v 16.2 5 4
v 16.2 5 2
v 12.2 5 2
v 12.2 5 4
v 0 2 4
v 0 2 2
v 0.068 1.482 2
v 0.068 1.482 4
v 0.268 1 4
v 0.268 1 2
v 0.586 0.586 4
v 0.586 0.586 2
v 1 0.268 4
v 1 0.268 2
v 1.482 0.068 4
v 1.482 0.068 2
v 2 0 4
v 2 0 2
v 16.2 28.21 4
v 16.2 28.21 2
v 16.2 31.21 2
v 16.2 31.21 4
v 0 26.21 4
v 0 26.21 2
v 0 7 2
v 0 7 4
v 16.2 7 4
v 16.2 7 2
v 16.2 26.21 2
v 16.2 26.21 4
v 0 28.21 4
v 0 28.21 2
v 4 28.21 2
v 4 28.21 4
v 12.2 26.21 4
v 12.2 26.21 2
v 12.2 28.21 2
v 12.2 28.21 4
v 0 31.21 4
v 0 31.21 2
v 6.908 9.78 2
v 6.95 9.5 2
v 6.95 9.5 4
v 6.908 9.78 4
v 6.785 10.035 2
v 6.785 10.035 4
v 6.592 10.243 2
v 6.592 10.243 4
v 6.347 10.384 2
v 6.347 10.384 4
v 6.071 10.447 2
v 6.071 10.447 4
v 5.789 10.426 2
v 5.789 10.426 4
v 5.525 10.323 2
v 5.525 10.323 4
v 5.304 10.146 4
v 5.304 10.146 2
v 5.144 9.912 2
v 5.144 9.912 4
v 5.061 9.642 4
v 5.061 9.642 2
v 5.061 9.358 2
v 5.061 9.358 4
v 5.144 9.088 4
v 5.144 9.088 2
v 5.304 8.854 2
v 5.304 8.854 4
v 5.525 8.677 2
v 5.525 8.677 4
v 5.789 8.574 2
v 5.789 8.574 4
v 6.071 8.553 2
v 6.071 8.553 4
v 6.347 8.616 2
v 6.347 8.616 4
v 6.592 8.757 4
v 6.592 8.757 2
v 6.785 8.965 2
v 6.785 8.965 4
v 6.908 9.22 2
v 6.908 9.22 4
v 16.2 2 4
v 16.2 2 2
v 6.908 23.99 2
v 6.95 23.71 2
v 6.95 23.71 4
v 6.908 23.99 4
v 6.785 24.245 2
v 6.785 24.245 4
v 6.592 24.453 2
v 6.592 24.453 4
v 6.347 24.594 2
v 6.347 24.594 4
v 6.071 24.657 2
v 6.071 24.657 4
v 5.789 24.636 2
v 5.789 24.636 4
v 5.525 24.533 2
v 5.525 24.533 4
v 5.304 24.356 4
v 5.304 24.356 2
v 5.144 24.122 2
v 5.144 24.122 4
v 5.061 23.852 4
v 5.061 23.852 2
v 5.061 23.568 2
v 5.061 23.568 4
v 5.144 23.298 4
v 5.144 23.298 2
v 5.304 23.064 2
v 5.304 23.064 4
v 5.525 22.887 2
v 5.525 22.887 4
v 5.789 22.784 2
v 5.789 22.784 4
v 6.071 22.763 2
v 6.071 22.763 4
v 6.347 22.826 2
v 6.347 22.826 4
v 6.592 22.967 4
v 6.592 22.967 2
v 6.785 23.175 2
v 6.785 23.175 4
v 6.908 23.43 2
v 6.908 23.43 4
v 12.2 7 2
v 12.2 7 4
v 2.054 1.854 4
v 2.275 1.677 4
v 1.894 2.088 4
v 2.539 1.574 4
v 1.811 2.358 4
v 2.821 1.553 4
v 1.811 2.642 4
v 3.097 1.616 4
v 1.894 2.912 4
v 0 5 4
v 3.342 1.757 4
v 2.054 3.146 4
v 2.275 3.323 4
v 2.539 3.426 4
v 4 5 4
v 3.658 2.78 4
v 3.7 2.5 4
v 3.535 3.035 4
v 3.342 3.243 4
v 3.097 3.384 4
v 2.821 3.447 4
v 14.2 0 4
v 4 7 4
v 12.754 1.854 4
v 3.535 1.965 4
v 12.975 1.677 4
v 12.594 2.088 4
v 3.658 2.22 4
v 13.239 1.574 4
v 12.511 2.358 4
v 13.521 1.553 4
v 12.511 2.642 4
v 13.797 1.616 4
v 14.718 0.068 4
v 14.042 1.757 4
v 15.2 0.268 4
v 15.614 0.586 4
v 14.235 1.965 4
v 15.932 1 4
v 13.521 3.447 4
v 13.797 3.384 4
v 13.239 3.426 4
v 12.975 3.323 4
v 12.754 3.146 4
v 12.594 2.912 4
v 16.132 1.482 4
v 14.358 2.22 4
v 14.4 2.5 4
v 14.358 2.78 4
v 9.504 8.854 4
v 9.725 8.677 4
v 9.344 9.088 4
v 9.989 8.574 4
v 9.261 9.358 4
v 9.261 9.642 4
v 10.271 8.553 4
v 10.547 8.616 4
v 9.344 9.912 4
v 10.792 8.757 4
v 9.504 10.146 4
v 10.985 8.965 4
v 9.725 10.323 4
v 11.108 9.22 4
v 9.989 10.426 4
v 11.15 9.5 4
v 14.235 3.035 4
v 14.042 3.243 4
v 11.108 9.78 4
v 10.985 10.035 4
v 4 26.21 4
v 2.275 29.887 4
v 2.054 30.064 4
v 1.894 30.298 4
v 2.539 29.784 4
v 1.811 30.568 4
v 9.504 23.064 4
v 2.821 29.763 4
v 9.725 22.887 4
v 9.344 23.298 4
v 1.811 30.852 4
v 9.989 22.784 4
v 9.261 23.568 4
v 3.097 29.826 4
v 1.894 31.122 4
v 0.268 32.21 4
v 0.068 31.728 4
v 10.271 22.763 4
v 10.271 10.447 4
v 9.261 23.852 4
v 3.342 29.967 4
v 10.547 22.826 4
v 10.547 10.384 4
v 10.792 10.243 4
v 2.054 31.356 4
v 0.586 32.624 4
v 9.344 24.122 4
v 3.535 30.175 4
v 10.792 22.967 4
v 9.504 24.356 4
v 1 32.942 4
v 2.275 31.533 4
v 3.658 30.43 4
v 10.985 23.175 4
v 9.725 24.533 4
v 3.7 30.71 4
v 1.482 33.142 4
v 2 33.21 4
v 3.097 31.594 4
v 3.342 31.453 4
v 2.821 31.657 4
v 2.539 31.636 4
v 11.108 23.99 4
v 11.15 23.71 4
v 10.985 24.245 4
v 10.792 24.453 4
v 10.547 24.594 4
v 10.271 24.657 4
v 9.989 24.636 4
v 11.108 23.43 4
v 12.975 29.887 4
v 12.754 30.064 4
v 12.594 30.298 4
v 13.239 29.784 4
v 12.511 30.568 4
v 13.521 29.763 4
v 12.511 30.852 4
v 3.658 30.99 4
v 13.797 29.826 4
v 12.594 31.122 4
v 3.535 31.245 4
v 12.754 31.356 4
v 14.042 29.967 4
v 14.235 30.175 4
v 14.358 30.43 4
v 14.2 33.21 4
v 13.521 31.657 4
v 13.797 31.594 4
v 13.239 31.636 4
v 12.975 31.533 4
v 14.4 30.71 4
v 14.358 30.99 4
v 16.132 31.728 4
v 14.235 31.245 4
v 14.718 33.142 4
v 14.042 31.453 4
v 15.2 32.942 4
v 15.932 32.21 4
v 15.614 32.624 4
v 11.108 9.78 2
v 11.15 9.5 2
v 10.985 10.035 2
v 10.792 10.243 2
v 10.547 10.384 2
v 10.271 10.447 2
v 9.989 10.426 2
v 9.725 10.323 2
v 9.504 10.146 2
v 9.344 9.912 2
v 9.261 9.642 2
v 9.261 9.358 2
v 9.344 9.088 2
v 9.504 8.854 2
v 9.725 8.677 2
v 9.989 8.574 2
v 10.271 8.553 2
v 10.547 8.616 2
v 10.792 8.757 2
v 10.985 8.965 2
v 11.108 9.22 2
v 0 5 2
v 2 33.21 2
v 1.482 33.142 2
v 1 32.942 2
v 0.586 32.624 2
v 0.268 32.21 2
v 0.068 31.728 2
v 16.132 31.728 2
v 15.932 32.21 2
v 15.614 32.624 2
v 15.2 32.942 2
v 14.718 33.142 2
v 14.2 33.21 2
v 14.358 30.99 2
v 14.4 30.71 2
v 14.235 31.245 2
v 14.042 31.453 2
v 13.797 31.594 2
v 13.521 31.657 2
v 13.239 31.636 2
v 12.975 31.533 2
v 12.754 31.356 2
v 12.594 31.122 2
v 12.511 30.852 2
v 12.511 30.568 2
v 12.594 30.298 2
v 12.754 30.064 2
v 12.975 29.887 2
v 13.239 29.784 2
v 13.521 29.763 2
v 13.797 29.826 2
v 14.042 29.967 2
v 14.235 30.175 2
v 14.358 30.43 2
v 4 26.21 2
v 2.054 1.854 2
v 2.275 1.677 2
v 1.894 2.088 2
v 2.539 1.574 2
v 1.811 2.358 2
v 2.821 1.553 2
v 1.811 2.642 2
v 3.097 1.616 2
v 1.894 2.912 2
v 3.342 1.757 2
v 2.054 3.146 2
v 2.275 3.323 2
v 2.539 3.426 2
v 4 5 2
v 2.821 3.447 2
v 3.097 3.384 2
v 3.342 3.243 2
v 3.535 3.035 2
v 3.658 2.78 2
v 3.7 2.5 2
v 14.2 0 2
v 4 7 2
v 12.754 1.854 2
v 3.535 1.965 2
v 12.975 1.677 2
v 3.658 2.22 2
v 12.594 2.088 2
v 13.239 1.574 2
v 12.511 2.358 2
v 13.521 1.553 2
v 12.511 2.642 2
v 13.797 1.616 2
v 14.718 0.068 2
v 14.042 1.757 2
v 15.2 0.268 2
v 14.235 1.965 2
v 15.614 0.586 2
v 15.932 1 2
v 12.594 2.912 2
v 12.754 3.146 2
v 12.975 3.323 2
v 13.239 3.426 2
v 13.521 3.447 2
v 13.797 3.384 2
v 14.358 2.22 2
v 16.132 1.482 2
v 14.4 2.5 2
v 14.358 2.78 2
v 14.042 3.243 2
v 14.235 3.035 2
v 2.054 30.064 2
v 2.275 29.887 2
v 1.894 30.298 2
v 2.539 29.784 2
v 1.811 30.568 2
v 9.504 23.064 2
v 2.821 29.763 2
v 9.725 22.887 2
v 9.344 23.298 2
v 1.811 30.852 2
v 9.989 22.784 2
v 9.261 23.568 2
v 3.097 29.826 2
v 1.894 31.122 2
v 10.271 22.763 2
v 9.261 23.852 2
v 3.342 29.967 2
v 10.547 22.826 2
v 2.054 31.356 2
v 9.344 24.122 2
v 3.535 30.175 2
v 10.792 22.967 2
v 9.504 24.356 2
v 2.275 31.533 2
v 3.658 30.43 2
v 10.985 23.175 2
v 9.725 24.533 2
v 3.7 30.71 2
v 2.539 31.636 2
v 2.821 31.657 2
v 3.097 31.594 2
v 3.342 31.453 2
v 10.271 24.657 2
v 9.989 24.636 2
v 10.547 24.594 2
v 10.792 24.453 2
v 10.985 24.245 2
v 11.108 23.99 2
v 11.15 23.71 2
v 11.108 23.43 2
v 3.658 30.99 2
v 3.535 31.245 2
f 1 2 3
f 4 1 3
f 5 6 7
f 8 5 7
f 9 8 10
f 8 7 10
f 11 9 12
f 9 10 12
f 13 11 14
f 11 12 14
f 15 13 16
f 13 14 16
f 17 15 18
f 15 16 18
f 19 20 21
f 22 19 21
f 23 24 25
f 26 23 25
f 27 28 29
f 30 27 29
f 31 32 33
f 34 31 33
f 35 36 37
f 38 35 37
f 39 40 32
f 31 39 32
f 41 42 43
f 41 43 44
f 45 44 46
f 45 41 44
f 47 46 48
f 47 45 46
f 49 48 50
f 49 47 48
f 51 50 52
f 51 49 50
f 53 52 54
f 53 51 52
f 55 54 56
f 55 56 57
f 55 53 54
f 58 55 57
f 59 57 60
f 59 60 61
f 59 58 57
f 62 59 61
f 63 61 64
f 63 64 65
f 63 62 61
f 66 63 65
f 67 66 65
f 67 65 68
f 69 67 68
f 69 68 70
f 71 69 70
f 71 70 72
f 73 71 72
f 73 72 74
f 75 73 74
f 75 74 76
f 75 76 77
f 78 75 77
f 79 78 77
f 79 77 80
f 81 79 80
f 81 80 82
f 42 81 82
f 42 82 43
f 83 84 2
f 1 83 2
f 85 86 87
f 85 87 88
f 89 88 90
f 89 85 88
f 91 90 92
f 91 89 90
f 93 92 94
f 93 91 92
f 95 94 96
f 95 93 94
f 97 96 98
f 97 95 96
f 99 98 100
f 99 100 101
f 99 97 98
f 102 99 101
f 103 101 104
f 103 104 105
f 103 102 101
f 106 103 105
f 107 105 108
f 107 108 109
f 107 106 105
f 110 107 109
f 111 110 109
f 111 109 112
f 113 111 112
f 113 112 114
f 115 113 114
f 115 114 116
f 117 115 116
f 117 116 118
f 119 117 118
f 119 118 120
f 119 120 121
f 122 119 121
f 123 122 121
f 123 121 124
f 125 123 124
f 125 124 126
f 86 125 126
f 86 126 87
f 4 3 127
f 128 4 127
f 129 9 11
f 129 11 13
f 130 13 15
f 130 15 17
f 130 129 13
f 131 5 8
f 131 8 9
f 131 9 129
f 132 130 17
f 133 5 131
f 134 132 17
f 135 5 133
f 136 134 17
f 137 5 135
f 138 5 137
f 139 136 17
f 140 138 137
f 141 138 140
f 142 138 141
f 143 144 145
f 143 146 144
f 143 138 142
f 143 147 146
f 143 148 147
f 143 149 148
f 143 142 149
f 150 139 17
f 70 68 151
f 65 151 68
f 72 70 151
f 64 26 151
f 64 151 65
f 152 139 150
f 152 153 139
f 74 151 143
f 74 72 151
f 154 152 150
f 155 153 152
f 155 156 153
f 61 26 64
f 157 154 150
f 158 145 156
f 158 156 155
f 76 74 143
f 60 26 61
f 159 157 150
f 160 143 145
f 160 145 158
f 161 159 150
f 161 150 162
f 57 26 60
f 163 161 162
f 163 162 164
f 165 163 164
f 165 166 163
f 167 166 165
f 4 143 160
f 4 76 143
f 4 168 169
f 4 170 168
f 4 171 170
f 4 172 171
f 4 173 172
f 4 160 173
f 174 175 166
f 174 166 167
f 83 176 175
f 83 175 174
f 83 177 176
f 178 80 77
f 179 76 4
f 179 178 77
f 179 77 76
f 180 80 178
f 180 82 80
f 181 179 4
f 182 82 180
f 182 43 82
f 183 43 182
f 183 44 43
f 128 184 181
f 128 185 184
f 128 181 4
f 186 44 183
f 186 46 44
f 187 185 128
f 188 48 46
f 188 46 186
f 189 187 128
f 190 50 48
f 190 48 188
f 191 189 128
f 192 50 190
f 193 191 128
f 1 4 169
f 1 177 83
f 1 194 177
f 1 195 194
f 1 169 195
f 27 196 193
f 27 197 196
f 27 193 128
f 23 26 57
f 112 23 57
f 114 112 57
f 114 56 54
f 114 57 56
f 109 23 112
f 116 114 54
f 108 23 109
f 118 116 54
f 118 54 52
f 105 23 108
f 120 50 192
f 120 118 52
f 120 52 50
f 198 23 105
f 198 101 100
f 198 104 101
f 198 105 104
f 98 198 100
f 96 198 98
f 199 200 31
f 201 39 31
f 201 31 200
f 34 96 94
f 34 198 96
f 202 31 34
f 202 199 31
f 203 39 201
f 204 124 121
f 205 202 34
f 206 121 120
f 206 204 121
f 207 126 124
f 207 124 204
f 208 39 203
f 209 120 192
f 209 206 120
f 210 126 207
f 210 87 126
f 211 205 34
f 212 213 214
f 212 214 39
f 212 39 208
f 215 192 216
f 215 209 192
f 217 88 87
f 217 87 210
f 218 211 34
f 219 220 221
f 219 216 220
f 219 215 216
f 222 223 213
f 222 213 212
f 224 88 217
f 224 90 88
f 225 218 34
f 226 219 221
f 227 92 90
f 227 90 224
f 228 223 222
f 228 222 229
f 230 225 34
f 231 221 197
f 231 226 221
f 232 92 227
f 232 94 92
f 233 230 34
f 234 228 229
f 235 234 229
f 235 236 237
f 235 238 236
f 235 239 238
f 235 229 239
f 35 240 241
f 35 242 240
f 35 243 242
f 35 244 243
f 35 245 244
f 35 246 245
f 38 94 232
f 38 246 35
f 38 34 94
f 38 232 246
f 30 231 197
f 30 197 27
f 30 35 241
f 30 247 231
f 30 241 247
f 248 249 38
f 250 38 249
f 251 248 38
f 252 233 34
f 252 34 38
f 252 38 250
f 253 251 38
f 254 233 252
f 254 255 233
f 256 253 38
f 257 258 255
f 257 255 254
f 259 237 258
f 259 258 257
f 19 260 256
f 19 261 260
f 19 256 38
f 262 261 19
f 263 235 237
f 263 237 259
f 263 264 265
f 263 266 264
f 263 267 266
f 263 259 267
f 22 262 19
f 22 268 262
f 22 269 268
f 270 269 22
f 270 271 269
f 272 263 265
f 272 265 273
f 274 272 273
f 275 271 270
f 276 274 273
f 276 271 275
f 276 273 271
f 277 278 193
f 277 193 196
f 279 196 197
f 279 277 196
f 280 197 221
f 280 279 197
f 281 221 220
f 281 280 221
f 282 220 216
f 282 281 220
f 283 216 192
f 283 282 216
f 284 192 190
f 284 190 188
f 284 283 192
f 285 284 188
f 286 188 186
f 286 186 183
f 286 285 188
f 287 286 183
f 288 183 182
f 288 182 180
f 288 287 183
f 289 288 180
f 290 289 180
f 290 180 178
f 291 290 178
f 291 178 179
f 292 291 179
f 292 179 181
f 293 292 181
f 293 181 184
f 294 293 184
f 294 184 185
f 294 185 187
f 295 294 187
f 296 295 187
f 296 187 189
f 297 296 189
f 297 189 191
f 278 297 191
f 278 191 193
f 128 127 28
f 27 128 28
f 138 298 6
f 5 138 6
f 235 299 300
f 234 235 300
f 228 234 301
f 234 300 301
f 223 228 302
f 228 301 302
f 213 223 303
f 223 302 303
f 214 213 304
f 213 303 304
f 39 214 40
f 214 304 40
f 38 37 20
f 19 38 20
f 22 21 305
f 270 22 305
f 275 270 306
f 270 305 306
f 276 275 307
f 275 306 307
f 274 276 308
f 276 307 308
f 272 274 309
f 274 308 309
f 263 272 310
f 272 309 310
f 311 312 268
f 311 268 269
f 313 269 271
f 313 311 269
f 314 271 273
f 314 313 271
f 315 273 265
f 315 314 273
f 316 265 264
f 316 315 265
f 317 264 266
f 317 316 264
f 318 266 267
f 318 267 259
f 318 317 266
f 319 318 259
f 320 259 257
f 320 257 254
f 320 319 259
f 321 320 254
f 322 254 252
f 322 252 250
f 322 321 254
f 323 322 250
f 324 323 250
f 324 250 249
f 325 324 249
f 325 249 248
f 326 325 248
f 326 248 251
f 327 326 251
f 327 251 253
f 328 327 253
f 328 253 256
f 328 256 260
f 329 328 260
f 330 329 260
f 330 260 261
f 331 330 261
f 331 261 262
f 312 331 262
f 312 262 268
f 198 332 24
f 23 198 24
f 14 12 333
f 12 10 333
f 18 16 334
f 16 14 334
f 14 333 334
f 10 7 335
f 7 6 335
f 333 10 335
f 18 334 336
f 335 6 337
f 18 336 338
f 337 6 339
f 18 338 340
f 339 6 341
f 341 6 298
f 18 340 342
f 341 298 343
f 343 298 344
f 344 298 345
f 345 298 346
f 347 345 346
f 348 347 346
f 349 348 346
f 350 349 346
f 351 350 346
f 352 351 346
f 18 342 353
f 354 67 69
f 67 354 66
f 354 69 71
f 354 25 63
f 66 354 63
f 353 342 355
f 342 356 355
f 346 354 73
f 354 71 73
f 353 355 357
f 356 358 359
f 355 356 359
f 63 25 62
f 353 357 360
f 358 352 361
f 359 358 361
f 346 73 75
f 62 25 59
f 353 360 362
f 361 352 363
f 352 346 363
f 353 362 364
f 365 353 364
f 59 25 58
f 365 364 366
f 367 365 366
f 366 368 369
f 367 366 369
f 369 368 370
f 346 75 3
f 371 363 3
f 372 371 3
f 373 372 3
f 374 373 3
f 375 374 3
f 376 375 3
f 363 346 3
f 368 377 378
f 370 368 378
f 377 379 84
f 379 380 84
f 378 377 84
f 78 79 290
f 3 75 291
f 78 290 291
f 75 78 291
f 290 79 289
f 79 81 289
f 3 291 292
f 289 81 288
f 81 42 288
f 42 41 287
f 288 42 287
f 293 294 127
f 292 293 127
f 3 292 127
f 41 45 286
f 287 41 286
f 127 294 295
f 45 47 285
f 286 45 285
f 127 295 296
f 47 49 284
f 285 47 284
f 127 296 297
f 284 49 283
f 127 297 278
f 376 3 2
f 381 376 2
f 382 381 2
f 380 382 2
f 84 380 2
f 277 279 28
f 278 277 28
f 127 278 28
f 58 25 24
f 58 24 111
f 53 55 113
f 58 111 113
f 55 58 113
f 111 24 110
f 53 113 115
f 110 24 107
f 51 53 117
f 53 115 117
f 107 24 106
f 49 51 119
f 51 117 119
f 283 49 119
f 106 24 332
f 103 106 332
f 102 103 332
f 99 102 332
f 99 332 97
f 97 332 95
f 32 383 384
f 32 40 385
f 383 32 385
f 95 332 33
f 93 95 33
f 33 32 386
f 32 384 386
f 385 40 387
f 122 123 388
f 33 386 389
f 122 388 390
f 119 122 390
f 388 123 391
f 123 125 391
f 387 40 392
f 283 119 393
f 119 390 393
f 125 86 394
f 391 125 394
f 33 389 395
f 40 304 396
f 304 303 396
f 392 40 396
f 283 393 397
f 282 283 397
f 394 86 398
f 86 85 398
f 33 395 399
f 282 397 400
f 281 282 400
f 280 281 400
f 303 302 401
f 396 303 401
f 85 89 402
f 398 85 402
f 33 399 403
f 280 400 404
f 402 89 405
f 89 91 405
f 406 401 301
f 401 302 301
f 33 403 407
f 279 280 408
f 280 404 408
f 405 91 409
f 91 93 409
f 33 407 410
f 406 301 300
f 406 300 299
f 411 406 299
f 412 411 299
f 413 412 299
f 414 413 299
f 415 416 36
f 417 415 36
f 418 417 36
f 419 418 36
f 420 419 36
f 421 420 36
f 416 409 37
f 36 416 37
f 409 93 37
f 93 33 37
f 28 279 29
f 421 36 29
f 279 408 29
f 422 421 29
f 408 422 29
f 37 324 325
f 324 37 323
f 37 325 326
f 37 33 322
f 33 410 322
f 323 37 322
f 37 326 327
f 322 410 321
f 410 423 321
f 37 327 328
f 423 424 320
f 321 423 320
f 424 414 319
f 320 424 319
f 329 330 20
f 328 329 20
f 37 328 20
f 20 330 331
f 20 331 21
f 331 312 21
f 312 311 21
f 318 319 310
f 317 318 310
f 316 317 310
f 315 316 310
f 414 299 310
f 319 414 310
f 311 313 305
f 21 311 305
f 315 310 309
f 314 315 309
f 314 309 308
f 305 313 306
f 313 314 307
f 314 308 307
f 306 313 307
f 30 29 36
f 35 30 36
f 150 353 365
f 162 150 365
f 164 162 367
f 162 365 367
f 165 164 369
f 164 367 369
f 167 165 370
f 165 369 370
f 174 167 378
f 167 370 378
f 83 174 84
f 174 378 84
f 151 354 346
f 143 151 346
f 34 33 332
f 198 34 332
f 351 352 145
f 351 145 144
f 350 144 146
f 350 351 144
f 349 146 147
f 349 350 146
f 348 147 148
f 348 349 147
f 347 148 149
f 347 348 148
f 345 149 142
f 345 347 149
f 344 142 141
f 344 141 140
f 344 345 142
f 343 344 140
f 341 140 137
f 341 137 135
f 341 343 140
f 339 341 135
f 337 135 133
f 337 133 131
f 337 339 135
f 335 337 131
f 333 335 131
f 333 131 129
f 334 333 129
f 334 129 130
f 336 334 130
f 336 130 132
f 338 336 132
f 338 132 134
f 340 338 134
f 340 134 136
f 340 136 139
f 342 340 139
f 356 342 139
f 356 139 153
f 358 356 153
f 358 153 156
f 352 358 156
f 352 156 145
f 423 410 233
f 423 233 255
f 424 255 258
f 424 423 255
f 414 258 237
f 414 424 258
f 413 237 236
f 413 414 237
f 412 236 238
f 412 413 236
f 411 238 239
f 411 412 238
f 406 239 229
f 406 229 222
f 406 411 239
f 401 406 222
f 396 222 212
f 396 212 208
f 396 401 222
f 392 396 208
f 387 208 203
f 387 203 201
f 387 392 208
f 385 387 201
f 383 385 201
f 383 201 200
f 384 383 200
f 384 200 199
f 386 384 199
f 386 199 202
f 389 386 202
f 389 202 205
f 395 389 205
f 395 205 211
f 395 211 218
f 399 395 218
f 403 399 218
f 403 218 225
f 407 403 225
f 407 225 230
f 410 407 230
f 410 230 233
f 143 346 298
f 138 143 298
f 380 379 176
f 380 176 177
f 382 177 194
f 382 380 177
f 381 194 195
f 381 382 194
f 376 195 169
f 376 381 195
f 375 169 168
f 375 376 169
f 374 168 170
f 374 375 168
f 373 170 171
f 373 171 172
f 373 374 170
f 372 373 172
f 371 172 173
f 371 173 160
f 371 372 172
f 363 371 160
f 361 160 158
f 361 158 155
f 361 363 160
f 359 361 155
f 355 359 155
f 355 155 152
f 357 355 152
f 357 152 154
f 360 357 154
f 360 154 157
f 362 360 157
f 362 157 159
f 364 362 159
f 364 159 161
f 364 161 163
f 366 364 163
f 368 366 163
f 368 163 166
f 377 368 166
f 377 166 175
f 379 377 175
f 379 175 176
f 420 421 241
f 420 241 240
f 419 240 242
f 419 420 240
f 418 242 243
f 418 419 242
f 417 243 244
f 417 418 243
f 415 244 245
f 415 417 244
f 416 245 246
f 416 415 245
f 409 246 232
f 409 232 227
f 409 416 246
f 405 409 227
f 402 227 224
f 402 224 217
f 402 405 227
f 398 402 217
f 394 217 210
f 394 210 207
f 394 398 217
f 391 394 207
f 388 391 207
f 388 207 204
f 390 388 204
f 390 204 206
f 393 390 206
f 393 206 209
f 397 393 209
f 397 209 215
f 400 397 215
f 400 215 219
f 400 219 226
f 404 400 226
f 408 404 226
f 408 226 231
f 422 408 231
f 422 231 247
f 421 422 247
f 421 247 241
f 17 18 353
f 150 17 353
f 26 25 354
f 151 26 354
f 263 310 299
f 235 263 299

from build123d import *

# Parameters (mm, degrees)
SKETCH1_R           = 0.95
BOSS_EXTRUDE1_DEPTH = 4
SKETCH2_W           = 16.2
SKETCH2_H           = 33.21
CUT_EXTRUDE2_DEPTH  = 2


with BuildPart() as part:
    # Sketch1 → Boss-Extrude1 (new body)
    with BuildSketch(Plane.XY):
        with BuildLine():
            Line((0, 26.21), (0, 7))
            Line((0, 7), (4, 7))
            Line((4, 7), (4, 5))
            Line((4, 5), (0, 5))
            Line((0, 5), (0, 2))
            ThreePointArc((0, 2), (0.585786438, 0.585786438), (2, 0))
            Line((2, 0), (14.2, 0))
            ThreePointArc((14.2, 0), (15.614213562, 0.585786438), (16.2, 2))
            Line((16.2, 2), (16.2, 5))
            Line((16.2, 5), (12.2, 5))
            Line((12.2, 5), (12.2, 7))
            Line((12.2, 7), (16.2, 7))
            Line((16.2, 7), (16.2, 26.21))
            Line((16.2, 26.21), (12.2, 26.21))
            Line((12.2, 26.21), (12.2, 28.21))
            Line((12.2, 28.21), (16.2, 28.21))
            Line((16.2, 28.21), (16.2, 31.21))
            ThreePointArc((16.2, 31.21), (15.614213562, 32.624213562), (14.2, 33.21))
            Line((14.2, 33.21), (2, 33.21))
            ThreePointArc((2, 33.21), (0.585786438, 32.624213562), (0, 31.21))
            Line((0, 31.21), (0, 28.21))
            Line((0, 28.21), (4, 28.21))
            Line((4, 28.21), (4, 26.21))
            Line((4, 26.21), (0, 26.21))
        make_face()
        with Locations((13.45, 2.5)):
            Circle(SKETCH1_R, mode=Mode.SUBTRACT)
        with Locations((10.2, 9.5)):
            Circle(SKETCH1_R, mode=Mode.SUBTRACT)
        with Locations((2.75, 30.71)):
            Circle(SKETCH1_R, mode=Mode.SUBTRACT)
        with Locations((6, 23.71)):
            Circle(SKETCH1_R, mode=Mode.SUBTRACT)
        with Locations((6, 9.5)):
            Circle(SKETCH1_R, mode=Mode.SUBTRACT)
        with Locations((2.75, 2.5)):
            Circle(SKETCH1_R, mode=Mode.SUBTRACT)
        with Locations((10.2, 23.71)):
            Circle(SKETCH1_R, mode=Mode.SUBTRACT)
        with Locations((13.45, 30.71)):
            Circle(SKETCH1_R, mode=Mode.SUBTRACT)
    extrude(amount=BOSS_EXTRUDE1_DEPTH)

    # Sketch2 → Cut-Extrude2 (cut)
    with BuildSketch(Plane.XY):
        with Locations((8.1, 16.605)):
            Rectangle(SKETCH2_W, SKETCH2_H)
    extrude(amount=CUT_EXTRUDE2_DEPTH, mode=Mode.SUBTRACT)


solid = part.part
